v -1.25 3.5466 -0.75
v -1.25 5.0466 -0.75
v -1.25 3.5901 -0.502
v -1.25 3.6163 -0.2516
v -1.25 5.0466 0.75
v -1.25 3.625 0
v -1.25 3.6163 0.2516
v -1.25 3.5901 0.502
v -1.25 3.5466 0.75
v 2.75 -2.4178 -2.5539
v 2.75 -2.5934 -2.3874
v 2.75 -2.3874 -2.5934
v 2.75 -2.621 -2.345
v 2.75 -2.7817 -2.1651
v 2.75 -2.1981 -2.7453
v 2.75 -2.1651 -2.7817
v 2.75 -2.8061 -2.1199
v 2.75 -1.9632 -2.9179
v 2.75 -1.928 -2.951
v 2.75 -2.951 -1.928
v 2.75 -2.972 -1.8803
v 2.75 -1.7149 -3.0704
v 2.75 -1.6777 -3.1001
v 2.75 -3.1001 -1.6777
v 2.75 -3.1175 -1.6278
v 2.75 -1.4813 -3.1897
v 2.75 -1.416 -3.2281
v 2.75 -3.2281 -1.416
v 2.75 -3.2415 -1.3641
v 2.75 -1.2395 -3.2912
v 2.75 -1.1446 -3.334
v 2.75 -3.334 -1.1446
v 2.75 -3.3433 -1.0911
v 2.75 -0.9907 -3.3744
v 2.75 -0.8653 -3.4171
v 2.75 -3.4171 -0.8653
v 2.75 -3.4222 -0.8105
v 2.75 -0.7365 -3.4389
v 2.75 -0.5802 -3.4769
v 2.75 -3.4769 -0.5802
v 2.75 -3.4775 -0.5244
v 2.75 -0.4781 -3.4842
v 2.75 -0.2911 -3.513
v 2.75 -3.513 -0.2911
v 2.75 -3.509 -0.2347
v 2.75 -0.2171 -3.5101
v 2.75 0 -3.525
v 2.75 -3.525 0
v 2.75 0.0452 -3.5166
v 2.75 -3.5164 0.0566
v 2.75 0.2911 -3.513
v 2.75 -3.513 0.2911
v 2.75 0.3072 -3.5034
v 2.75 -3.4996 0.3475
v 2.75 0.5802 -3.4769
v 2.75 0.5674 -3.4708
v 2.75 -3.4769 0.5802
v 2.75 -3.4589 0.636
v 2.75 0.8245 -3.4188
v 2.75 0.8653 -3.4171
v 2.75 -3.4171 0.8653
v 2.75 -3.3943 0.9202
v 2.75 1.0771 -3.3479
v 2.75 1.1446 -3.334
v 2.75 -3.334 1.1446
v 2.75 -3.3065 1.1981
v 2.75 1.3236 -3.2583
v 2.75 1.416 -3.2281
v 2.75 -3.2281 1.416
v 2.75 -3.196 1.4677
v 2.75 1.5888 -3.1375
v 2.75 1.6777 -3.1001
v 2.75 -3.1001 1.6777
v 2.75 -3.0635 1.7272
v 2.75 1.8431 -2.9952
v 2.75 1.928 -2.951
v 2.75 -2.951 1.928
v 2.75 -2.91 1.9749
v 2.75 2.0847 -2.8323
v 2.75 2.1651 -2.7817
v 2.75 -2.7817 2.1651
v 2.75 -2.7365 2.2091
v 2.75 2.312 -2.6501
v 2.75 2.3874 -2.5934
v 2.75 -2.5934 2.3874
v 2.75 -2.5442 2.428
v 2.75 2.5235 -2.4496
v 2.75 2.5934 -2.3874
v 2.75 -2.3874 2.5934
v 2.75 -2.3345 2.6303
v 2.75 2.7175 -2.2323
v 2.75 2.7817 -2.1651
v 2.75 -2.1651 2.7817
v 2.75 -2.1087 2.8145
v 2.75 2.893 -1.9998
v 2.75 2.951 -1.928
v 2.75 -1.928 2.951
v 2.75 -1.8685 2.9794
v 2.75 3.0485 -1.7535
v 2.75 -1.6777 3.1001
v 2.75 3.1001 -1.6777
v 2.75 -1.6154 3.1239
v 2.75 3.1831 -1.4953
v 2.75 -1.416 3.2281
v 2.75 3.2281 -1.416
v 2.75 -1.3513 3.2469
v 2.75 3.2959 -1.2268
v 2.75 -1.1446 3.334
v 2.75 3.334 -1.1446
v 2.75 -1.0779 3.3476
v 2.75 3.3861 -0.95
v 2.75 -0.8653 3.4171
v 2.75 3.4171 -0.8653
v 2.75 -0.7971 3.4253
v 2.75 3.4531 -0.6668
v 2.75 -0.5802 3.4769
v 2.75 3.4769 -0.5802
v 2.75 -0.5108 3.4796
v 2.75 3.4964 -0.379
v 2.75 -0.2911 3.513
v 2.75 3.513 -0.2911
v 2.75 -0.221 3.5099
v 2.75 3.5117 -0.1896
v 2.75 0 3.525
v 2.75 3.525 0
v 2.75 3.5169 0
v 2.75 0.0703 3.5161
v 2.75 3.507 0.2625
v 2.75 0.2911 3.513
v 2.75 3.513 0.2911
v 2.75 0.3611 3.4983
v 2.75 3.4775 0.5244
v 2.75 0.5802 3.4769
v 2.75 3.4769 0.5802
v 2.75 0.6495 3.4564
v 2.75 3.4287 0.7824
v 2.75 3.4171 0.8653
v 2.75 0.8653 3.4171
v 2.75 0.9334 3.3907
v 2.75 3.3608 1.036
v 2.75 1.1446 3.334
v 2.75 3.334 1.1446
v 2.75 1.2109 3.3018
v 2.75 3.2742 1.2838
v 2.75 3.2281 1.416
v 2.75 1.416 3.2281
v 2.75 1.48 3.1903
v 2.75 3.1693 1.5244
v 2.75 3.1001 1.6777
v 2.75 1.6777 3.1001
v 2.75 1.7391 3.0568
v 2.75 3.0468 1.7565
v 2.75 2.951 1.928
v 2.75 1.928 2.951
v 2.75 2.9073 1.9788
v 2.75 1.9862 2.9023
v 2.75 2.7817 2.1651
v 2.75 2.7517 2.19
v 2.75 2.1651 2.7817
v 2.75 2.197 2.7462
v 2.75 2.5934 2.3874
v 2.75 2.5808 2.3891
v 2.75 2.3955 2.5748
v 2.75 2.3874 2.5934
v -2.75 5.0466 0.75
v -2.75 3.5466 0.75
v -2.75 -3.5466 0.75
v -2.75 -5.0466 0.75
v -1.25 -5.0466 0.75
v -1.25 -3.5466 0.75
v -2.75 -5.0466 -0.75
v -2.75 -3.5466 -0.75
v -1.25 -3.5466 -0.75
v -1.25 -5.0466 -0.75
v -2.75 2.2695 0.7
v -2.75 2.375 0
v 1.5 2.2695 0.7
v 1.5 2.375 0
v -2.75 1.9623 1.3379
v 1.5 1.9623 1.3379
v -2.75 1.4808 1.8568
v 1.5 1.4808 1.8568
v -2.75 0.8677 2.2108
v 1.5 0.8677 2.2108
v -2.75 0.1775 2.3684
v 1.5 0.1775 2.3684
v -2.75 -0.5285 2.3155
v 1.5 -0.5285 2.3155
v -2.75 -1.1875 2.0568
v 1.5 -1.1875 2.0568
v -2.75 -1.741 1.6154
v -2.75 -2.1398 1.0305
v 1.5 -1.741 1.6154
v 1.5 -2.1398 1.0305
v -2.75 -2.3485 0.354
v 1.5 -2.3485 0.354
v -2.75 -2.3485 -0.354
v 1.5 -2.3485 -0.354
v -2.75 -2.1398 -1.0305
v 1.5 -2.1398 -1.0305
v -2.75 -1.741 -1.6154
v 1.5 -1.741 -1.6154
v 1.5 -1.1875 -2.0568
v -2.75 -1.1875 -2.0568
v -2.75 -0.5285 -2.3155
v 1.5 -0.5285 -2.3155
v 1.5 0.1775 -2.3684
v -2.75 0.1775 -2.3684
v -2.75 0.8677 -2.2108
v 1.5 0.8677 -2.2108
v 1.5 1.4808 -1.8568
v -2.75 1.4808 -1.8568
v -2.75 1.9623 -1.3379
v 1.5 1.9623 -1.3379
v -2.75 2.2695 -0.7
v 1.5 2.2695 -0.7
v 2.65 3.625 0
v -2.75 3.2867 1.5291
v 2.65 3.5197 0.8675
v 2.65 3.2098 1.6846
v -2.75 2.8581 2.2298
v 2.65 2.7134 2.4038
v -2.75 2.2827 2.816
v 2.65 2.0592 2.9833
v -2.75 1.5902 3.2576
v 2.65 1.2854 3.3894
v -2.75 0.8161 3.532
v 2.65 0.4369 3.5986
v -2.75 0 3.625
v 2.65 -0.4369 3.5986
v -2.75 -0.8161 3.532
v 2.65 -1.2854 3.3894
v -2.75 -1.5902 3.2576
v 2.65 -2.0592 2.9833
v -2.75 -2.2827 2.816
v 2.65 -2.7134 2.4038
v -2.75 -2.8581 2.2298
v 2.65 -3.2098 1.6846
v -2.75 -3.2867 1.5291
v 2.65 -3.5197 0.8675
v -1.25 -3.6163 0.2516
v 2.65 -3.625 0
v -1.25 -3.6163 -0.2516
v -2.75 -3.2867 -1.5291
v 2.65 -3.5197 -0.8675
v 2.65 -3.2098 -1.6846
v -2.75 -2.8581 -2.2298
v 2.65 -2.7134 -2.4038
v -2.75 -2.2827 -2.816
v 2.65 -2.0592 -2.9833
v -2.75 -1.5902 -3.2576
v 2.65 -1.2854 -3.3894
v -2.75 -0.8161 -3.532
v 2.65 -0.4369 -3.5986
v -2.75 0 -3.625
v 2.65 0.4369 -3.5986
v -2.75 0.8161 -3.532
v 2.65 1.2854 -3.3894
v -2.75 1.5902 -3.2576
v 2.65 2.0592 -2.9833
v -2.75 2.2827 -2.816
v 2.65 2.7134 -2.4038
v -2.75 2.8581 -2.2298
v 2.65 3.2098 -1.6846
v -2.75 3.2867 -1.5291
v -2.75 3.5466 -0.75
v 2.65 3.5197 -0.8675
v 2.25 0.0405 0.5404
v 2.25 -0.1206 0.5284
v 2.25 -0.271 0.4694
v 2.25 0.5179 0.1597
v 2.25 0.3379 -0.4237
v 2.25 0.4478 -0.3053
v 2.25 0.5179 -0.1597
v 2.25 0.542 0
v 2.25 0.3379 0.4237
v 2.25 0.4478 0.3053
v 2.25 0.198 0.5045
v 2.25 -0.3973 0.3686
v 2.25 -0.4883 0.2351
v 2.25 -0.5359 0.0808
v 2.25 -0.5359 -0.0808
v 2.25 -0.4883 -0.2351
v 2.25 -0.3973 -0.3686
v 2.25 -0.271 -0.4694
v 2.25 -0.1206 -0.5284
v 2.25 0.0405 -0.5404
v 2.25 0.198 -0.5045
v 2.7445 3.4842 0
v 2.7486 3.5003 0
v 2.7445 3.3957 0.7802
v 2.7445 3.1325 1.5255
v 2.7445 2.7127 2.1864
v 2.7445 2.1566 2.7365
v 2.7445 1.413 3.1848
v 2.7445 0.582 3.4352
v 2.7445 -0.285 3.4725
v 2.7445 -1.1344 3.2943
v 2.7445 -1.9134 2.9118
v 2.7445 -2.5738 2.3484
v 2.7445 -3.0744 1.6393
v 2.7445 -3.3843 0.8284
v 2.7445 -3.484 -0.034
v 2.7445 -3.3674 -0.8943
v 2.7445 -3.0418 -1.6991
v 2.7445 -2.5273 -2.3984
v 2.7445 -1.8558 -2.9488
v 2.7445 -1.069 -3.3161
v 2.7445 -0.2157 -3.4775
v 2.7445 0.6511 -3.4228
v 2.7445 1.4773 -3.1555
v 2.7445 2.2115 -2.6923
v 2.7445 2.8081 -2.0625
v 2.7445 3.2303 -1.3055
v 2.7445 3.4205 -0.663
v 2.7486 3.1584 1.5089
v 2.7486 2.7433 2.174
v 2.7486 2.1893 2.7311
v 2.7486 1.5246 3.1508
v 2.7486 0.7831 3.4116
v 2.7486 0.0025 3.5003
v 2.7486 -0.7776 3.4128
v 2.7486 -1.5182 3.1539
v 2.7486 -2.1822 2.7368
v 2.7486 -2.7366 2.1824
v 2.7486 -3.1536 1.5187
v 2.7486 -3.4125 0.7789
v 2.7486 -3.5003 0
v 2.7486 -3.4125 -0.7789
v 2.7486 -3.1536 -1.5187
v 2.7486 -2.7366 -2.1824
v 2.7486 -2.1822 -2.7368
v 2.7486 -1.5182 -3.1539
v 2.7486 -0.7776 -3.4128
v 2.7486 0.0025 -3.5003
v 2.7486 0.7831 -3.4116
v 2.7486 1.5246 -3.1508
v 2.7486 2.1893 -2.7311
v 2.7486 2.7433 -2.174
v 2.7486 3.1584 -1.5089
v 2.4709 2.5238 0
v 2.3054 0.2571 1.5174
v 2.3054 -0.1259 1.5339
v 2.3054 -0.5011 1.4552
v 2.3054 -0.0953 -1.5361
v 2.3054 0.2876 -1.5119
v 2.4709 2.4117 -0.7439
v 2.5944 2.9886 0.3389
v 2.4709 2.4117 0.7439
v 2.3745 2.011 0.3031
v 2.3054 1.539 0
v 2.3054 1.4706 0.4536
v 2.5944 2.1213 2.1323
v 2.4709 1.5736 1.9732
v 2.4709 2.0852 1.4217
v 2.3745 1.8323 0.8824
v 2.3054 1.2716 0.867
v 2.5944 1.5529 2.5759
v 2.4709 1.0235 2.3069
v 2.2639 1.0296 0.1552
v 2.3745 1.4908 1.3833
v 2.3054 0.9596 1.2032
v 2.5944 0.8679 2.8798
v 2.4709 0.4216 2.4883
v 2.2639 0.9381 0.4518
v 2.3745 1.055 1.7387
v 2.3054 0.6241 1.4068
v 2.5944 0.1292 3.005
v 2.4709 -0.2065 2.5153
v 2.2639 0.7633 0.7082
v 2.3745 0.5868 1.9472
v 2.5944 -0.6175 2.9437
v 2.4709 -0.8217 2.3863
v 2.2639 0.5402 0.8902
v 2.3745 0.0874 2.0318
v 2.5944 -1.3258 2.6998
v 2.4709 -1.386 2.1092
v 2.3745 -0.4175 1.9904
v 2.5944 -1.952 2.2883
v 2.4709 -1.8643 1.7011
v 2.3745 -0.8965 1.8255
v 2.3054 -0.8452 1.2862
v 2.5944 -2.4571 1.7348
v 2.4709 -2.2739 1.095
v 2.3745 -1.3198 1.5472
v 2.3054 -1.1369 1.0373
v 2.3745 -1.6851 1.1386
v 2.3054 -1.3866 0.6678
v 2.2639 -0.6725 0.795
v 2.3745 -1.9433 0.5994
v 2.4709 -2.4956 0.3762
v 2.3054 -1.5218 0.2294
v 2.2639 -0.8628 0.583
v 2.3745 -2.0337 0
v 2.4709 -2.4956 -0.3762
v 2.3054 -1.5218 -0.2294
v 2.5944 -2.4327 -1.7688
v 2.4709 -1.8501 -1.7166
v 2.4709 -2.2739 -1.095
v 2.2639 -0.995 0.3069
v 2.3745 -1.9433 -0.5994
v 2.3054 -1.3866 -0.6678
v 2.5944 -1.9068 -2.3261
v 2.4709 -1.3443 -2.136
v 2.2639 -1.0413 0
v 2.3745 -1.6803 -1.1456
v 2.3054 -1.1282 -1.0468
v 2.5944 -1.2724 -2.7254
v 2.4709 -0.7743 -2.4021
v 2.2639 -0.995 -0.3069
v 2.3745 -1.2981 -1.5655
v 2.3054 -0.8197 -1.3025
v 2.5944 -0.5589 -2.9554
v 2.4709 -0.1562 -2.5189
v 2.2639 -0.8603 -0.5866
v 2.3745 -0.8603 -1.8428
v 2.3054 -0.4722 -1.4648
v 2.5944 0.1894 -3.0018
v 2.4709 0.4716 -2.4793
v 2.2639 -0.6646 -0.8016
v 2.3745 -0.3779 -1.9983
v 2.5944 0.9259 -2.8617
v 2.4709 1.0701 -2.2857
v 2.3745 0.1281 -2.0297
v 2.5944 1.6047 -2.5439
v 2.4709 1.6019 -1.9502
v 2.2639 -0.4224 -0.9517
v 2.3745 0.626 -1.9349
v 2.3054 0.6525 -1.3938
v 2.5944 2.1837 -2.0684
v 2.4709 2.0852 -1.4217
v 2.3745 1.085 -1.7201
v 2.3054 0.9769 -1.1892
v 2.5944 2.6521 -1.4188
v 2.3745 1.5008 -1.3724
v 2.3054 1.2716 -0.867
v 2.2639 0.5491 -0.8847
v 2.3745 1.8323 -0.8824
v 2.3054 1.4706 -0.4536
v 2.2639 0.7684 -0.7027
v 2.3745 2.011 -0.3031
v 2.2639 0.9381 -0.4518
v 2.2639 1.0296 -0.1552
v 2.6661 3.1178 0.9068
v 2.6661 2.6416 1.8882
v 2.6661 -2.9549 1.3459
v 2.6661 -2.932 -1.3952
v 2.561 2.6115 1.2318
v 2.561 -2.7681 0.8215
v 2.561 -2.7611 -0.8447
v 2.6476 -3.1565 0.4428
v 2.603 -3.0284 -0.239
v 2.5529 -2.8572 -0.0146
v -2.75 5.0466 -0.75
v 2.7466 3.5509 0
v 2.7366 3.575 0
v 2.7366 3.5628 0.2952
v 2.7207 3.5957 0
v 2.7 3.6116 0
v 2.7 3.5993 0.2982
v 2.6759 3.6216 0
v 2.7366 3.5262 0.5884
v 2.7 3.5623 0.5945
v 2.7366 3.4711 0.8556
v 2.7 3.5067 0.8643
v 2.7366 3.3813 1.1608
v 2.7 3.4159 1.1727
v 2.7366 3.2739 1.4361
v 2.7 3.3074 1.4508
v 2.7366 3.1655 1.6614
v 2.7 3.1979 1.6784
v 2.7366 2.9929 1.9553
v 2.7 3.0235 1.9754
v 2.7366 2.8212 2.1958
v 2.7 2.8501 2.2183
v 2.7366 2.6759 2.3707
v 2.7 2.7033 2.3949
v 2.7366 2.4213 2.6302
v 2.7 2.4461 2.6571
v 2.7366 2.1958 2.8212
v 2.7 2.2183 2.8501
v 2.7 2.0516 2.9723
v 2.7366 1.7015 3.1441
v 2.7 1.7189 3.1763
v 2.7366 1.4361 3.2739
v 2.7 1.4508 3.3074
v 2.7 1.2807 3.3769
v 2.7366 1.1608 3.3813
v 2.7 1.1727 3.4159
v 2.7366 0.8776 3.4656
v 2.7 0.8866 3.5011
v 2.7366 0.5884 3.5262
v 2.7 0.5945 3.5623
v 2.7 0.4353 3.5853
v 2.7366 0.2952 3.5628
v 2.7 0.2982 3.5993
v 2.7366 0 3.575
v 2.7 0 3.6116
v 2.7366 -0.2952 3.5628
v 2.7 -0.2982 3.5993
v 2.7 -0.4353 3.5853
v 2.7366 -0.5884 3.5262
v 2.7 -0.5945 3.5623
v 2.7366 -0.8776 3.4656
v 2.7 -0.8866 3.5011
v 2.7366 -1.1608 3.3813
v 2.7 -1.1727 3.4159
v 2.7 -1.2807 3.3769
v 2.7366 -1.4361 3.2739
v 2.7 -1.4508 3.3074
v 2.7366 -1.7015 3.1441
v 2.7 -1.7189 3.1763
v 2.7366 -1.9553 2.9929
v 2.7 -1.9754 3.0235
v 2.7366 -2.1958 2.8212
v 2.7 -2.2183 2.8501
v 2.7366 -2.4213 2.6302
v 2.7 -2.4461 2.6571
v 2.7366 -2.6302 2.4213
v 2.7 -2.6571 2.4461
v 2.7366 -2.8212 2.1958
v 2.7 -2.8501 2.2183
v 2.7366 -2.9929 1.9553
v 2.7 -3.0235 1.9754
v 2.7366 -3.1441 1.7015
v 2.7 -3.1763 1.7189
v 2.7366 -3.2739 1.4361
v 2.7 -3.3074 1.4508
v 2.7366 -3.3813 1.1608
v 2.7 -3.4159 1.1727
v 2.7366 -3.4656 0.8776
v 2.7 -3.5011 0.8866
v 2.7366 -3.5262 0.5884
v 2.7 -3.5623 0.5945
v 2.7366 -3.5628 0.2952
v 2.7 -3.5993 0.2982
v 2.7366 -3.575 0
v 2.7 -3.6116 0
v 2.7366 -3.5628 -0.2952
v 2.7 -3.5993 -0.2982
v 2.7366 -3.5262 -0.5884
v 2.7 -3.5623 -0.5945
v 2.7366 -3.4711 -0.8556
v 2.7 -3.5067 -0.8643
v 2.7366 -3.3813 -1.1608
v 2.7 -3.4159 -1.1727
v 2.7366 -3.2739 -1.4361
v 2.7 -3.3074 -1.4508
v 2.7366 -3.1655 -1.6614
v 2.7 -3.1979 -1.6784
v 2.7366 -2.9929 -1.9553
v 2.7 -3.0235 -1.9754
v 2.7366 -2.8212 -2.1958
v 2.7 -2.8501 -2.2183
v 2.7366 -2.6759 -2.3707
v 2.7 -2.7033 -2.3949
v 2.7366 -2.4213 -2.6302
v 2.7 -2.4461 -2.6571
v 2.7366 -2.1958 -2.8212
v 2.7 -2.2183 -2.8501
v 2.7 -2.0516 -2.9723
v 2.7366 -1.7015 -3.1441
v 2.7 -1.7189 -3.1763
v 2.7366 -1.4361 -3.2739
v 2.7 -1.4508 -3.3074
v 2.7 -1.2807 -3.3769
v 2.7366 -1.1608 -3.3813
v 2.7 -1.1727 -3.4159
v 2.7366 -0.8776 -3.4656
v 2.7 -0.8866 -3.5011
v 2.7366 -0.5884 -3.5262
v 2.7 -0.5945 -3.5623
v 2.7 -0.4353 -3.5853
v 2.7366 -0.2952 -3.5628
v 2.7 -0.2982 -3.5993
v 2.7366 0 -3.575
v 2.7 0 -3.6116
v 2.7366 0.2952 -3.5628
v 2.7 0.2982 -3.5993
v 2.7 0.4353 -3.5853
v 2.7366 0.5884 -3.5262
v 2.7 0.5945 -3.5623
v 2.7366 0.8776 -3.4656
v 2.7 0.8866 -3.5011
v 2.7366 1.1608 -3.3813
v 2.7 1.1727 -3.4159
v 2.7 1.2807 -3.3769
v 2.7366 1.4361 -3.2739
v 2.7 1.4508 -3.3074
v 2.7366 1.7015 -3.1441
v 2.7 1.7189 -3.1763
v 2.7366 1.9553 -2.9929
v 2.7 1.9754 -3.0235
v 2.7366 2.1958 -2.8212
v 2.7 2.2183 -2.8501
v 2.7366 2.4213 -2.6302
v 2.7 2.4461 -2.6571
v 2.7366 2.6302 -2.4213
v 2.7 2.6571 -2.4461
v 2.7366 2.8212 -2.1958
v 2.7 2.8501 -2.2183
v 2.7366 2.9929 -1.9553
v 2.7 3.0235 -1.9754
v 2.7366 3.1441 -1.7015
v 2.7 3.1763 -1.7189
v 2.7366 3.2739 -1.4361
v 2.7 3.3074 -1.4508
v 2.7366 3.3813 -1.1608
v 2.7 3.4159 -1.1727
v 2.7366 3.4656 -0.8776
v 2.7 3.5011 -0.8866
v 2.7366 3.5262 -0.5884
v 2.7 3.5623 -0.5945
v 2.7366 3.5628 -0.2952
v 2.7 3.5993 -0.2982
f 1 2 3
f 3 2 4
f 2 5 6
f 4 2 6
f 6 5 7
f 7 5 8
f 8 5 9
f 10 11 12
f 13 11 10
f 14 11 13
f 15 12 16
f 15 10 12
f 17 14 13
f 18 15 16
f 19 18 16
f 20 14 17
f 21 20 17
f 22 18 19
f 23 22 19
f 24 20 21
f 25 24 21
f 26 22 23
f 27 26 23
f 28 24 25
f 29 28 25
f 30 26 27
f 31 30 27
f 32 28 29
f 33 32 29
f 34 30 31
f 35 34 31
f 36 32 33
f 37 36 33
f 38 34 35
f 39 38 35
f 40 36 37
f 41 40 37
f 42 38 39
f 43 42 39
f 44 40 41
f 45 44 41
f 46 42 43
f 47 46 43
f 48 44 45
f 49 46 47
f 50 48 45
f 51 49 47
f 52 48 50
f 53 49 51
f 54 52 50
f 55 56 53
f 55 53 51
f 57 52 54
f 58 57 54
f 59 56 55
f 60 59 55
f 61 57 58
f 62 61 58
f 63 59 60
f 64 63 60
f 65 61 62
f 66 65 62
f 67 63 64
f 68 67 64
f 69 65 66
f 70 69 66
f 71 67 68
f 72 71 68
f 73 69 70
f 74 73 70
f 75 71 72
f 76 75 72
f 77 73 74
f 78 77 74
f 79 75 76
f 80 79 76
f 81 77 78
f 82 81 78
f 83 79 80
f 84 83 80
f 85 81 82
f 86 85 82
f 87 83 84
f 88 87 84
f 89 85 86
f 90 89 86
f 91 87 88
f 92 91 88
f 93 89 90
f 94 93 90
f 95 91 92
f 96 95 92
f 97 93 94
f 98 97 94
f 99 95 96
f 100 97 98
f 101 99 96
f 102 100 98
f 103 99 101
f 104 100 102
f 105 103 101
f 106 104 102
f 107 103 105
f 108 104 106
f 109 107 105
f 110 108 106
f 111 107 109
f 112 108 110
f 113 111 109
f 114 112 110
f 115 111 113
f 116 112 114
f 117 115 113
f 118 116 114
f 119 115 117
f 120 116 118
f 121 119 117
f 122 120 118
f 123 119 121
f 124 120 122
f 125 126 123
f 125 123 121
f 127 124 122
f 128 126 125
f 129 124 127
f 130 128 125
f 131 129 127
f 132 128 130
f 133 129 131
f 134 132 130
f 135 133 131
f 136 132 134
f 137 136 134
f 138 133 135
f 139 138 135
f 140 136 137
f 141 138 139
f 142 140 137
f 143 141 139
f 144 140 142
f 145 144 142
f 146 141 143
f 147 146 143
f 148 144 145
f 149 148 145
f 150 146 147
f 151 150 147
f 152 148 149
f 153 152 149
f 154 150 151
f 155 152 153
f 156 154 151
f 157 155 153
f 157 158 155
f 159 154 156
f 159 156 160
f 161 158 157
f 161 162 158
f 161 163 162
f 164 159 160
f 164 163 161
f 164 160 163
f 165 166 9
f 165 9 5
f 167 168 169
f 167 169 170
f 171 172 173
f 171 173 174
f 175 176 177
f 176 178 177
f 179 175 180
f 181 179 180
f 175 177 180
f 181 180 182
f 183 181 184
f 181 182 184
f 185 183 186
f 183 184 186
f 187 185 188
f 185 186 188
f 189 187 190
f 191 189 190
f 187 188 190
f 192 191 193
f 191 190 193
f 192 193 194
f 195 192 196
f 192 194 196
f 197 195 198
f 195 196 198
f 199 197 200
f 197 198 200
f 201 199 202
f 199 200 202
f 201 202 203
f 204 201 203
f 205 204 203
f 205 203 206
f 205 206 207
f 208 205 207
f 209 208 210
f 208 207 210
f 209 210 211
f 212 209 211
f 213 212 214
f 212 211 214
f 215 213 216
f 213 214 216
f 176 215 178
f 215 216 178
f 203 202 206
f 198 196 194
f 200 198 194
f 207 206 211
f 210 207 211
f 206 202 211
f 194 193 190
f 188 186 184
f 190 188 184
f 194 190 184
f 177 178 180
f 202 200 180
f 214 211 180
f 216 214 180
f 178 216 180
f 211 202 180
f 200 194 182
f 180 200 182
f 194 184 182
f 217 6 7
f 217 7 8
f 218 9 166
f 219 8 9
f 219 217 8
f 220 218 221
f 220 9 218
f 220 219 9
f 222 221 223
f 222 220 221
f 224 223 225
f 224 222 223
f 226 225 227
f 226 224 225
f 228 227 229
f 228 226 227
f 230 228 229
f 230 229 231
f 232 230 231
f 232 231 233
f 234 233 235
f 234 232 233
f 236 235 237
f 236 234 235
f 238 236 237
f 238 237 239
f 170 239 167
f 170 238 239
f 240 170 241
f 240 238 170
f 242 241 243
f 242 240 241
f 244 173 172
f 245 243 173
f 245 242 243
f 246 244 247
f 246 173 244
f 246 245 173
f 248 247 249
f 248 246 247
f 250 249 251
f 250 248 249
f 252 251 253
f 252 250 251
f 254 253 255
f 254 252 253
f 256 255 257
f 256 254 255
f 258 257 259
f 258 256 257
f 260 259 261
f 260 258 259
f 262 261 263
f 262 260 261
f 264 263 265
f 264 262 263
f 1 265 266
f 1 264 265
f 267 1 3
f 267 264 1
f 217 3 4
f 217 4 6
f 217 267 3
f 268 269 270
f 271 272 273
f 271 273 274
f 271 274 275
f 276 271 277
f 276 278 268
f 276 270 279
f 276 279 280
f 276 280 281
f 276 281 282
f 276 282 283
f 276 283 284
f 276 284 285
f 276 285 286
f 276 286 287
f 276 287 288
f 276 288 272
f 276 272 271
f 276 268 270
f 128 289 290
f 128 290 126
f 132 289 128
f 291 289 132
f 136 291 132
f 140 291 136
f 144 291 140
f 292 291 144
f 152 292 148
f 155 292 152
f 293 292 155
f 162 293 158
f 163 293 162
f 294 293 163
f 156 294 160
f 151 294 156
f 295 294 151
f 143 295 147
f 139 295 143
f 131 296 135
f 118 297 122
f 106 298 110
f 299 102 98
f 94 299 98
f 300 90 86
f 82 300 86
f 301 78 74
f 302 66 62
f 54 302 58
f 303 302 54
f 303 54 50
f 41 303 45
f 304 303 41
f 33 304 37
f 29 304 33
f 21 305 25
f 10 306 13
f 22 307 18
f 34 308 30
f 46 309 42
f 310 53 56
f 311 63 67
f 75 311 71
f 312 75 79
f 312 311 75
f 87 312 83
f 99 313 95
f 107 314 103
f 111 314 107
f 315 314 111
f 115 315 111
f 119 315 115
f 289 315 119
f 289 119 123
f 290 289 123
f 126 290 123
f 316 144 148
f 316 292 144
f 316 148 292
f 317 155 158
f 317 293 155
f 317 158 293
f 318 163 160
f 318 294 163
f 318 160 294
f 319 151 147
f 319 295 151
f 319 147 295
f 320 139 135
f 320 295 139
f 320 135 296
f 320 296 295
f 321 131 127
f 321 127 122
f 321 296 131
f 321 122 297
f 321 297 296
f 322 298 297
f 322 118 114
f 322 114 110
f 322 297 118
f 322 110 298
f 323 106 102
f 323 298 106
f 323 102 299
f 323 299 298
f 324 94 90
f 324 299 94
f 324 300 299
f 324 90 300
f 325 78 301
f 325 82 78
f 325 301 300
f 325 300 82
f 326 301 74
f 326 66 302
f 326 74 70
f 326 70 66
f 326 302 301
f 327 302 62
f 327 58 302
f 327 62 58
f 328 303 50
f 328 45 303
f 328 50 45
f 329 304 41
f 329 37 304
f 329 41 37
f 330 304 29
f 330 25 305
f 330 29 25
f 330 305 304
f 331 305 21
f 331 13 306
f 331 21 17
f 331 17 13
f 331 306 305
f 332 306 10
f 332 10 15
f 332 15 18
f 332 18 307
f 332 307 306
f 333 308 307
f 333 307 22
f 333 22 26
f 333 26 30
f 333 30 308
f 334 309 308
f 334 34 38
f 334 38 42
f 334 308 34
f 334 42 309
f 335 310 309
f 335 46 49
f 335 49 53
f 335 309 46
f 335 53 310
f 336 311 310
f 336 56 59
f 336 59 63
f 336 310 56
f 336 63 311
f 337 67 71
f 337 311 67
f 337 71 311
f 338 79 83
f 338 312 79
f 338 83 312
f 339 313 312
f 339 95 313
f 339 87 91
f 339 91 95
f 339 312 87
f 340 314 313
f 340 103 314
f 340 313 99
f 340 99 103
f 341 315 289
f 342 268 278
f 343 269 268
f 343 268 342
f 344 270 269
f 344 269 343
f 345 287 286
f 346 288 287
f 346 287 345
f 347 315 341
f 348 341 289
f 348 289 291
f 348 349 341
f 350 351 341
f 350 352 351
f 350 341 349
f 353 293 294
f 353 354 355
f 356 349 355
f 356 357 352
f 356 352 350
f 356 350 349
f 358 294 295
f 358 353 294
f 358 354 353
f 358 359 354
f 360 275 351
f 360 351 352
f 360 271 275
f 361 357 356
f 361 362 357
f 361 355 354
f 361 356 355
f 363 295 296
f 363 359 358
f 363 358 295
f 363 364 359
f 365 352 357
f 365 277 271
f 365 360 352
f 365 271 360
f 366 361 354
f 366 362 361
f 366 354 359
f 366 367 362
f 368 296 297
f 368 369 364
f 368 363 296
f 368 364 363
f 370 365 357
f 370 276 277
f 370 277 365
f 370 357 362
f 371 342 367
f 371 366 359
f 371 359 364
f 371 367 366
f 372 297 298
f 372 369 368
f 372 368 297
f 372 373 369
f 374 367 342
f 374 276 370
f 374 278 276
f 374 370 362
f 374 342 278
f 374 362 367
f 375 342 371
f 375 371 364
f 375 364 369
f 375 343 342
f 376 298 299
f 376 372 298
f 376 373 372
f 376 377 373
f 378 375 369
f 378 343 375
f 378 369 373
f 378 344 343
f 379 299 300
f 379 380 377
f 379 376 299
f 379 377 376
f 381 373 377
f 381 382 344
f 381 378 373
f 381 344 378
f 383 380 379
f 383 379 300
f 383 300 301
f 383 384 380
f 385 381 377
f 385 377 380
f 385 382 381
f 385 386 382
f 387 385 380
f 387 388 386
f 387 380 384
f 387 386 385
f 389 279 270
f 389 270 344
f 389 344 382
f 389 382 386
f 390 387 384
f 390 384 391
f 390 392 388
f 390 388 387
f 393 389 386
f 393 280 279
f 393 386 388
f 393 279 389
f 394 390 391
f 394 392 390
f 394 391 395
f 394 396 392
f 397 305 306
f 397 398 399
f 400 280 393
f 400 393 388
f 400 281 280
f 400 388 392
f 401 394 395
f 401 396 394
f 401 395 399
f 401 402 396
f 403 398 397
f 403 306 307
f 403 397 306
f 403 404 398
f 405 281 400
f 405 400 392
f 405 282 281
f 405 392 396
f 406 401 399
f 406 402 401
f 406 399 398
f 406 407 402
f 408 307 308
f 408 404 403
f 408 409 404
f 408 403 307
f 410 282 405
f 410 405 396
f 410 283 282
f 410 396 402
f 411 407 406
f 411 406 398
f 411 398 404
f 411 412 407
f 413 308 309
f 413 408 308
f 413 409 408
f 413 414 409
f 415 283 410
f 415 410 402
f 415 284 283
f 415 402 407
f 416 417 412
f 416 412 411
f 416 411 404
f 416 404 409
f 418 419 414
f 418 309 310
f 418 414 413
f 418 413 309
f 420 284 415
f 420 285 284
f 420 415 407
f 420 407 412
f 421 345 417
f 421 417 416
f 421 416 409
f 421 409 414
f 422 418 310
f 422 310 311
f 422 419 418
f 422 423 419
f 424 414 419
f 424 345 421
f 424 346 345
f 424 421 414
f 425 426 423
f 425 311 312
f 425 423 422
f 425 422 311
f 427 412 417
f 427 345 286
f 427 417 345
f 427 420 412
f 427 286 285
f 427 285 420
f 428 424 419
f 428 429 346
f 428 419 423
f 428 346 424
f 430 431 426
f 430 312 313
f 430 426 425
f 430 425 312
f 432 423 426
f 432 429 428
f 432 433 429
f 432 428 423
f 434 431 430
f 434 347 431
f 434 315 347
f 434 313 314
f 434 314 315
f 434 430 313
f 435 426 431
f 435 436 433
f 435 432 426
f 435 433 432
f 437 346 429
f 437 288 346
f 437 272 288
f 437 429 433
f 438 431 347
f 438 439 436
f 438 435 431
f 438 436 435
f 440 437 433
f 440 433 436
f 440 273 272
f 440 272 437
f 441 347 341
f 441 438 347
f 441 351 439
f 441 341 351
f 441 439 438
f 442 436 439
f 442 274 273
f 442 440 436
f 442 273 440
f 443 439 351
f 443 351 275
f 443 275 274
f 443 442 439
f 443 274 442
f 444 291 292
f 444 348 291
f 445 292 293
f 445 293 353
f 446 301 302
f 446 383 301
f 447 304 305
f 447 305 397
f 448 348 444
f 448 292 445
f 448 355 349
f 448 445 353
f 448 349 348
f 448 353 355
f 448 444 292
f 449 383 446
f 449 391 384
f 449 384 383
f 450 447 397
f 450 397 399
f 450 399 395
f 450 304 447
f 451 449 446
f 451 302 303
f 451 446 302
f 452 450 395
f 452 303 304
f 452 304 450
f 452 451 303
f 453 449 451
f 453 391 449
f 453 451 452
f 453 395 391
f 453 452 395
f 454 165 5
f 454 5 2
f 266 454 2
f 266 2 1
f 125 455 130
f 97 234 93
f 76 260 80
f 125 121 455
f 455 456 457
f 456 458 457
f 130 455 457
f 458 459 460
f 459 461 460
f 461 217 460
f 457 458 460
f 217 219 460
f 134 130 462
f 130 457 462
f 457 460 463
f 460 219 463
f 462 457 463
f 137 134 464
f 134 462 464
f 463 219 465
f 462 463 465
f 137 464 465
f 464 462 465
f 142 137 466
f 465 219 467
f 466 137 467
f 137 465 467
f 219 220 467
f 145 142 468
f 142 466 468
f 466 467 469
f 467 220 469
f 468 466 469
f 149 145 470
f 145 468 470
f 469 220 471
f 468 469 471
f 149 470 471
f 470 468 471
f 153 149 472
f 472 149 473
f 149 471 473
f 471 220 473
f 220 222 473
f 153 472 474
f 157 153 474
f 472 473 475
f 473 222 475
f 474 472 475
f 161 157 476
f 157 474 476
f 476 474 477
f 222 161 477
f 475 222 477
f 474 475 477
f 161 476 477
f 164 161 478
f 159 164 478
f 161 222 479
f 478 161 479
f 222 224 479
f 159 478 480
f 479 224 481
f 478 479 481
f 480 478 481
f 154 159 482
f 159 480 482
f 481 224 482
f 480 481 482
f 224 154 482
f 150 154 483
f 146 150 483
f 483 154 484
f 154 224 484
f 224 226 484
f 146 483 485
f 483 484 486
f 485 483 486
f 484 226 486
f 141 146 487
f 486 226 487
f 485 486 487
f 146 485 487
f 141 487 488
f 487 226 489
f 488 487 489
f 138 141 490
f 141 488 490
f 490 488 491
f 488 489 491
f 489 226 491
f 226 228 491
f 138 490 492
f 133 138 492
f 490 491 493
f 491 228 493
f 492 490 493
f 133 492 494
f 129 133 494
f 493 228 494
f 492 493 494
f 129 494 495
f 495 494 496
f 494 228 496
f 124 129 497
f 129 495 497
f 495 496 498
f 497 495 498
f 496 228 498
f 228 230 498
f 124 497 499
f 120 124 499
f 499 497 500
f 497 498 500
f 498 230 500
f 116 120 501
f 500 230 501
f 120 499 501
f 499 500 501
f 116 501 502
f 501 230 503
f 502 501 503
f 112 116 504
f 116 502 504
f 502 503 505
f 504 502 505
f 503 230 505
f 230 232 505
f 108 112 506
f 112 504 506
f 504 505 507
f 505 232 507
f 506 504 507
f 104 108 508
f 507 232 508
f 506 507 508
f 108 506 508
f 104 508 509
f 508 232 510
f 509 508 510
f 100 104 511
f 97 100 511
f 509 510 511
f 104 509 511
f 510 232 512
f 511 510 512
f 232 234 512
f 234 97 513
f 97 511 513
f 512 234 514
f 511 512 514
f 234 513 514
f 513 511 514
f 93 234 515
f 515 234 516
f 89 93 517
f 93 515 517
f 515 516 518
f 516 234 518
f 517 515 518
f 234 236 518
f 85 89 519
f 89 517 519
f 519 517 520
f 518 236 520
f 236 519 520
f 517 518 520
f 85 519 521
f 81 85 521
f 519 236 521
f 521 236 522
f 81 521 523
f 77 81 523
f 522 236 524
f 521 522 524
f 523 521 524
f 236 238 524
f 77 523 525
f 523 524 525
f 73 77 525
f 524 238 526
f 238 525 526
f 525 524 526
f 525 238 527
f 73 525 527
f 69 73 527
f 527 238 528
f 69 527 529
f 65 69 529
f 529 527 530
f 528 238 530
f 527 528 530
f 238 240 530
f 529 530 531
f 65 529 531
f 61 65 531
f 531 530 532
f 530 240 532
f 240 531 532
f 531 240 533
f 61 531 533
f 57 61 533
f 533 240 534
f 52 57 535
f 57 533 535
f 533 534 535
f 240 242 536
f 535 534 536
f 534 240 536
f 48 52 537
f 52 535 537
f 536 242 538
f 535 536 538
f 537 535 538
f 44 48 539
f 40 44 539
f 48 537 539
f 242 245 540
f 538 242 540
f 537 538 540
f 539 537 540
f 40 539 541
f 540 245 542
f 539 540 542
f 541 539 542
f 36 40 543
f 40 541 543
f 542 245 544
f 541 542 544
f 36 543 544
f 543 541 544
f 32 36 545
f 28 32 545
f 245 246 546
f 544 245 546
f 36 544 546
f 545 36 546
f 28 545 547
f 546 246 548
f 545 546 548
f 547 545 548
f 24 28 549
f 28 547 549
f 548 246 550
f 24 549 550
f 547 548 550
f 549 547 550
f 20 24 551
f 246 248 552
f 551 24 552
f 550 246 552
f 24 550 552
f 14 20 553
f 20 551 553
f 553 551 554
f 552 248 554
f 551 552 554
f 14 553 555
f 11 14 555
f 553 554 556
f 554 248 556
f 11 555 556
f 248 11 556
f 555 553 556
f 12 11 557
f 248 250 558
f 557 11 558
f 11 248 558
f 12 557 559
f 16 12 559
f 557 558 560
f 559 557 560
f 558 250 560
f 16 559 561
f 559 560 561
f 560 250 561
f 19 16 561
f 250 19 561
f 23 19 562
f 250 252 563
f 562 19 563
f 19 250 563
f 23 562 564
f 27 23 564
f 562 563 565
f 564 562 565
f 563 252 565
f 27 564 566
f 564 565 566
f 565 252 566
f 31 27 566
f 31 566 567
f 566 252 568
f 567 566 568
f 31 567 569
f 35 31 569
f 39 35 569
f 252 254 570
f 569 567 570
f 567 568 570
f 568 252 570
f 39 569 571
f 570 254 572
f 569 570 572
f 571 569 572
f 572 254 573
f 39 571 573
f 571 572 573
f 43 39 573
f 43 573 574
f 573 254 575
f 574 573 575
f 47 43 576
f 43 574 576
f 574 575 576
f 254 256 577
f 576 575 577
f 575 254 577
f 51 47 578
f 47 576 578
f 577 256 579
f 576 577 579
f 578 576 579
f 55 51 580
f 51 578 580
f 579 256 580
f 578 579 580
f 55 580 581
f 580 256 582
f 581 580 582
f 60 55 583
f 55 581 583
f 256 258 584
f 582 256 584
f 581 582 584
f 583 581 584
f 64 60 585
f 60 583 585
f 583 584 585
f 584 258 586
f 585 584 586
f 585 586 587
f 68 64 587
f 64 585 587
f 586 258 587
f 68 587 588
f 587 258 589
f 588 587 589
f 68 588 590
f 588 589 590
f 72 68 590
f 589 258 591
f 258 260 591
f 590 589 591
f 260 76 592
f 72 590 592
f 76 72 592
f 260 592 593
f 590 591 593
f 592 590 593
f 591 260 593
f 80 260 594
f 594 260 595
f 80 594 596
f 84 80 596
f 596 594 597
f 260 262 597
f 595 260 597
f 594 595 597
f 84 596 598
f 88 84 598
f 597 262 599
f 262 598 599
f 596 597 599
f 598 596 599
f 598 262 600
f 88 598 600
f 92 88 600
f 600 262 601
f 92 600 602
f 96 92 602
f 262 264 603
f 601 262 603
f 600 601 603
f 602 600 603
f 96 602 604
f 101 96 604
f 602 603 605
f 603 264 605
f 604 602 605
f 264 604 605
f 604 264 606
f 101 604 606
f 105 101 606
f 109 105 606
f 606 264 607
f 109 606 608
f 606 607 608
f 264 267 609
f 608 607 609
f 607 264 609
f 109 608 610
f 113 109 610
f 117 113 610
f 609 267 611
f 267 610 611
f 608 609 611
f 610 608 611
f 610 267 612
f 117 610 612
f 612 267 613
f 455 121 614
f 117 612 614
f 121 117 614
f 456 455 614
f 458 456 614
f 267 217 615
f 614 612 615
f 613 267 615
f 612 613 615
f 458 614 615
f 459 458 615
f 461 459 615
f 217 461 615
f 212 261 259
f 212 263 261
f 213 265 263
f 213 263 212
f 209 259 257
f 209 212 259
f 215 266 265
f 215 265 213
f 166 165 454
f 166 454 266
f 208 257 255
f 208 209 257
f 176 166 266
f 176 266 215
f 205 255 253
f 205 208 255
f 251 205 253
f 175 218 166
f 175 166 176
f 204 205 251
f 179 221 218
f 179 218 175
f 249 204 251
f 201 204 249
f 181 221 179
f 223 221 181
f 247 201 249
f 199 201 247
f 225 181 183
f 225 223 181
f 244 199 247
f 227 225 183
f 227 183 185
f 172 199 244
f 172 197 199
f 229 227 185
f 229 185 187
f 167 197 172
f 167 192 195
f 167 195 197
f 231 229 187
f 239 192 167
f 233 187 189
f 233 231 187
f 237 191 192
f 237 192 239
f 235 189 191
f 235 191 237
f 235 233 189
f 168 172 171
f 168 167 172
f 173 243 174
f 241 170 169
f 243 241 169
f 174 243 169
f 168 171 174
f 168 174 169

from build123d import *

# Parameters (mm, degrees)
F0_R     = 3.625
F1_DEPTH = 2.75
F2_T     = -1.25
F4_DEPTH = 1.5
F5_R     = 3.5
F6_DEPTH = 0.5
F8_R     = 0.1


# Not quite as in the source:
# - a fillet or chamfer that OpenCascade refuses, or shapes differently, is made with other operations: its cross-section is extruded or revolved along the edge and cut away or added


with BuildPart() as f1:
    # F0 (on Right) → F1 (new body, symmetric)
    with BuildSketch(Plane.YZ):
        Circle(F0_R)
    extrude(amount=F1_DEPTH, both=True)

    # F2
    f2_openings = [f1.faces().sort_by_distance(p)[0] for p in [
        (-2.75, 0, 0),
    ]]
    offset(amount=F2_T, openings=f2_openings)

    # F3 (on face) → F4 (join)
    with BuildSketch(Plane(origin=(-2.75, 0, 0), x_dir=(0, -1, 0), z_dir=(-1, 0, 0))):
        with BuildLine():
            Line((3.5465652398, -0.75), (5.0465652398, -0.75))
            Line((5.0465652398, -0.75), (5.0465652398, 0.75))
            Line((5.0465652398, 0.75), (3.5465652398, 0.75))
            ThreePointArc((3.5465652398, 0.75), (3.625, 0), (3.5465652398, -0.75))
        make_face()
        with BuildLine():
            Line((-3.5465652398, 0.75), (-5.0465652398, 0.75))
            Line((-5.0465652398, 0.75), (-5.0465652398, -0.75))
            Line((-5.0465652398, -0.75), (-3.5465652398, -0.75))
            ThreePointArc((-3.5465652398, -0.75), (-3.625, 0), (-3.5465652398, 0.75))
        make_face()
    extrude(amount=-F4_DEPTH)

    # F5 (on face) → F6 (cut)
    with BuildSketch(Plane.YZ.offset(2.75)):
        Circle(F5_R)
    extrude(amount=-F6_DEPTH, mode=Mode.SUBTRACT)

    # F7: fillet of radius 9 on 1 edges, made by hand

    # F7_s1 → F7_t2 (revolve)
    with BuildSketch(Plane.XY):
        with BuildLine():
            ThreePointArc((2.75, 3.5), (2.3758803254, 2.0419601084), (2.25, 0.5419601084))
            Line((2.25, 0.5419601084), (2.25, 3.5))
            Line((2.25, 3.5), (2.75, 3.5))
        make_face()
    revolve(axis=Axis((2.25, 0, 0), (1, 0, 0)))

    # F8
    f8_edges = [f1.edges().sort_by_distance(p)[0] for p in [
        (2.75, -3.5, 0),
        (2.75, -3.625, 0),
    ]]
    fillet(f8_edges, radius=F8_R)


solid = f1.part
